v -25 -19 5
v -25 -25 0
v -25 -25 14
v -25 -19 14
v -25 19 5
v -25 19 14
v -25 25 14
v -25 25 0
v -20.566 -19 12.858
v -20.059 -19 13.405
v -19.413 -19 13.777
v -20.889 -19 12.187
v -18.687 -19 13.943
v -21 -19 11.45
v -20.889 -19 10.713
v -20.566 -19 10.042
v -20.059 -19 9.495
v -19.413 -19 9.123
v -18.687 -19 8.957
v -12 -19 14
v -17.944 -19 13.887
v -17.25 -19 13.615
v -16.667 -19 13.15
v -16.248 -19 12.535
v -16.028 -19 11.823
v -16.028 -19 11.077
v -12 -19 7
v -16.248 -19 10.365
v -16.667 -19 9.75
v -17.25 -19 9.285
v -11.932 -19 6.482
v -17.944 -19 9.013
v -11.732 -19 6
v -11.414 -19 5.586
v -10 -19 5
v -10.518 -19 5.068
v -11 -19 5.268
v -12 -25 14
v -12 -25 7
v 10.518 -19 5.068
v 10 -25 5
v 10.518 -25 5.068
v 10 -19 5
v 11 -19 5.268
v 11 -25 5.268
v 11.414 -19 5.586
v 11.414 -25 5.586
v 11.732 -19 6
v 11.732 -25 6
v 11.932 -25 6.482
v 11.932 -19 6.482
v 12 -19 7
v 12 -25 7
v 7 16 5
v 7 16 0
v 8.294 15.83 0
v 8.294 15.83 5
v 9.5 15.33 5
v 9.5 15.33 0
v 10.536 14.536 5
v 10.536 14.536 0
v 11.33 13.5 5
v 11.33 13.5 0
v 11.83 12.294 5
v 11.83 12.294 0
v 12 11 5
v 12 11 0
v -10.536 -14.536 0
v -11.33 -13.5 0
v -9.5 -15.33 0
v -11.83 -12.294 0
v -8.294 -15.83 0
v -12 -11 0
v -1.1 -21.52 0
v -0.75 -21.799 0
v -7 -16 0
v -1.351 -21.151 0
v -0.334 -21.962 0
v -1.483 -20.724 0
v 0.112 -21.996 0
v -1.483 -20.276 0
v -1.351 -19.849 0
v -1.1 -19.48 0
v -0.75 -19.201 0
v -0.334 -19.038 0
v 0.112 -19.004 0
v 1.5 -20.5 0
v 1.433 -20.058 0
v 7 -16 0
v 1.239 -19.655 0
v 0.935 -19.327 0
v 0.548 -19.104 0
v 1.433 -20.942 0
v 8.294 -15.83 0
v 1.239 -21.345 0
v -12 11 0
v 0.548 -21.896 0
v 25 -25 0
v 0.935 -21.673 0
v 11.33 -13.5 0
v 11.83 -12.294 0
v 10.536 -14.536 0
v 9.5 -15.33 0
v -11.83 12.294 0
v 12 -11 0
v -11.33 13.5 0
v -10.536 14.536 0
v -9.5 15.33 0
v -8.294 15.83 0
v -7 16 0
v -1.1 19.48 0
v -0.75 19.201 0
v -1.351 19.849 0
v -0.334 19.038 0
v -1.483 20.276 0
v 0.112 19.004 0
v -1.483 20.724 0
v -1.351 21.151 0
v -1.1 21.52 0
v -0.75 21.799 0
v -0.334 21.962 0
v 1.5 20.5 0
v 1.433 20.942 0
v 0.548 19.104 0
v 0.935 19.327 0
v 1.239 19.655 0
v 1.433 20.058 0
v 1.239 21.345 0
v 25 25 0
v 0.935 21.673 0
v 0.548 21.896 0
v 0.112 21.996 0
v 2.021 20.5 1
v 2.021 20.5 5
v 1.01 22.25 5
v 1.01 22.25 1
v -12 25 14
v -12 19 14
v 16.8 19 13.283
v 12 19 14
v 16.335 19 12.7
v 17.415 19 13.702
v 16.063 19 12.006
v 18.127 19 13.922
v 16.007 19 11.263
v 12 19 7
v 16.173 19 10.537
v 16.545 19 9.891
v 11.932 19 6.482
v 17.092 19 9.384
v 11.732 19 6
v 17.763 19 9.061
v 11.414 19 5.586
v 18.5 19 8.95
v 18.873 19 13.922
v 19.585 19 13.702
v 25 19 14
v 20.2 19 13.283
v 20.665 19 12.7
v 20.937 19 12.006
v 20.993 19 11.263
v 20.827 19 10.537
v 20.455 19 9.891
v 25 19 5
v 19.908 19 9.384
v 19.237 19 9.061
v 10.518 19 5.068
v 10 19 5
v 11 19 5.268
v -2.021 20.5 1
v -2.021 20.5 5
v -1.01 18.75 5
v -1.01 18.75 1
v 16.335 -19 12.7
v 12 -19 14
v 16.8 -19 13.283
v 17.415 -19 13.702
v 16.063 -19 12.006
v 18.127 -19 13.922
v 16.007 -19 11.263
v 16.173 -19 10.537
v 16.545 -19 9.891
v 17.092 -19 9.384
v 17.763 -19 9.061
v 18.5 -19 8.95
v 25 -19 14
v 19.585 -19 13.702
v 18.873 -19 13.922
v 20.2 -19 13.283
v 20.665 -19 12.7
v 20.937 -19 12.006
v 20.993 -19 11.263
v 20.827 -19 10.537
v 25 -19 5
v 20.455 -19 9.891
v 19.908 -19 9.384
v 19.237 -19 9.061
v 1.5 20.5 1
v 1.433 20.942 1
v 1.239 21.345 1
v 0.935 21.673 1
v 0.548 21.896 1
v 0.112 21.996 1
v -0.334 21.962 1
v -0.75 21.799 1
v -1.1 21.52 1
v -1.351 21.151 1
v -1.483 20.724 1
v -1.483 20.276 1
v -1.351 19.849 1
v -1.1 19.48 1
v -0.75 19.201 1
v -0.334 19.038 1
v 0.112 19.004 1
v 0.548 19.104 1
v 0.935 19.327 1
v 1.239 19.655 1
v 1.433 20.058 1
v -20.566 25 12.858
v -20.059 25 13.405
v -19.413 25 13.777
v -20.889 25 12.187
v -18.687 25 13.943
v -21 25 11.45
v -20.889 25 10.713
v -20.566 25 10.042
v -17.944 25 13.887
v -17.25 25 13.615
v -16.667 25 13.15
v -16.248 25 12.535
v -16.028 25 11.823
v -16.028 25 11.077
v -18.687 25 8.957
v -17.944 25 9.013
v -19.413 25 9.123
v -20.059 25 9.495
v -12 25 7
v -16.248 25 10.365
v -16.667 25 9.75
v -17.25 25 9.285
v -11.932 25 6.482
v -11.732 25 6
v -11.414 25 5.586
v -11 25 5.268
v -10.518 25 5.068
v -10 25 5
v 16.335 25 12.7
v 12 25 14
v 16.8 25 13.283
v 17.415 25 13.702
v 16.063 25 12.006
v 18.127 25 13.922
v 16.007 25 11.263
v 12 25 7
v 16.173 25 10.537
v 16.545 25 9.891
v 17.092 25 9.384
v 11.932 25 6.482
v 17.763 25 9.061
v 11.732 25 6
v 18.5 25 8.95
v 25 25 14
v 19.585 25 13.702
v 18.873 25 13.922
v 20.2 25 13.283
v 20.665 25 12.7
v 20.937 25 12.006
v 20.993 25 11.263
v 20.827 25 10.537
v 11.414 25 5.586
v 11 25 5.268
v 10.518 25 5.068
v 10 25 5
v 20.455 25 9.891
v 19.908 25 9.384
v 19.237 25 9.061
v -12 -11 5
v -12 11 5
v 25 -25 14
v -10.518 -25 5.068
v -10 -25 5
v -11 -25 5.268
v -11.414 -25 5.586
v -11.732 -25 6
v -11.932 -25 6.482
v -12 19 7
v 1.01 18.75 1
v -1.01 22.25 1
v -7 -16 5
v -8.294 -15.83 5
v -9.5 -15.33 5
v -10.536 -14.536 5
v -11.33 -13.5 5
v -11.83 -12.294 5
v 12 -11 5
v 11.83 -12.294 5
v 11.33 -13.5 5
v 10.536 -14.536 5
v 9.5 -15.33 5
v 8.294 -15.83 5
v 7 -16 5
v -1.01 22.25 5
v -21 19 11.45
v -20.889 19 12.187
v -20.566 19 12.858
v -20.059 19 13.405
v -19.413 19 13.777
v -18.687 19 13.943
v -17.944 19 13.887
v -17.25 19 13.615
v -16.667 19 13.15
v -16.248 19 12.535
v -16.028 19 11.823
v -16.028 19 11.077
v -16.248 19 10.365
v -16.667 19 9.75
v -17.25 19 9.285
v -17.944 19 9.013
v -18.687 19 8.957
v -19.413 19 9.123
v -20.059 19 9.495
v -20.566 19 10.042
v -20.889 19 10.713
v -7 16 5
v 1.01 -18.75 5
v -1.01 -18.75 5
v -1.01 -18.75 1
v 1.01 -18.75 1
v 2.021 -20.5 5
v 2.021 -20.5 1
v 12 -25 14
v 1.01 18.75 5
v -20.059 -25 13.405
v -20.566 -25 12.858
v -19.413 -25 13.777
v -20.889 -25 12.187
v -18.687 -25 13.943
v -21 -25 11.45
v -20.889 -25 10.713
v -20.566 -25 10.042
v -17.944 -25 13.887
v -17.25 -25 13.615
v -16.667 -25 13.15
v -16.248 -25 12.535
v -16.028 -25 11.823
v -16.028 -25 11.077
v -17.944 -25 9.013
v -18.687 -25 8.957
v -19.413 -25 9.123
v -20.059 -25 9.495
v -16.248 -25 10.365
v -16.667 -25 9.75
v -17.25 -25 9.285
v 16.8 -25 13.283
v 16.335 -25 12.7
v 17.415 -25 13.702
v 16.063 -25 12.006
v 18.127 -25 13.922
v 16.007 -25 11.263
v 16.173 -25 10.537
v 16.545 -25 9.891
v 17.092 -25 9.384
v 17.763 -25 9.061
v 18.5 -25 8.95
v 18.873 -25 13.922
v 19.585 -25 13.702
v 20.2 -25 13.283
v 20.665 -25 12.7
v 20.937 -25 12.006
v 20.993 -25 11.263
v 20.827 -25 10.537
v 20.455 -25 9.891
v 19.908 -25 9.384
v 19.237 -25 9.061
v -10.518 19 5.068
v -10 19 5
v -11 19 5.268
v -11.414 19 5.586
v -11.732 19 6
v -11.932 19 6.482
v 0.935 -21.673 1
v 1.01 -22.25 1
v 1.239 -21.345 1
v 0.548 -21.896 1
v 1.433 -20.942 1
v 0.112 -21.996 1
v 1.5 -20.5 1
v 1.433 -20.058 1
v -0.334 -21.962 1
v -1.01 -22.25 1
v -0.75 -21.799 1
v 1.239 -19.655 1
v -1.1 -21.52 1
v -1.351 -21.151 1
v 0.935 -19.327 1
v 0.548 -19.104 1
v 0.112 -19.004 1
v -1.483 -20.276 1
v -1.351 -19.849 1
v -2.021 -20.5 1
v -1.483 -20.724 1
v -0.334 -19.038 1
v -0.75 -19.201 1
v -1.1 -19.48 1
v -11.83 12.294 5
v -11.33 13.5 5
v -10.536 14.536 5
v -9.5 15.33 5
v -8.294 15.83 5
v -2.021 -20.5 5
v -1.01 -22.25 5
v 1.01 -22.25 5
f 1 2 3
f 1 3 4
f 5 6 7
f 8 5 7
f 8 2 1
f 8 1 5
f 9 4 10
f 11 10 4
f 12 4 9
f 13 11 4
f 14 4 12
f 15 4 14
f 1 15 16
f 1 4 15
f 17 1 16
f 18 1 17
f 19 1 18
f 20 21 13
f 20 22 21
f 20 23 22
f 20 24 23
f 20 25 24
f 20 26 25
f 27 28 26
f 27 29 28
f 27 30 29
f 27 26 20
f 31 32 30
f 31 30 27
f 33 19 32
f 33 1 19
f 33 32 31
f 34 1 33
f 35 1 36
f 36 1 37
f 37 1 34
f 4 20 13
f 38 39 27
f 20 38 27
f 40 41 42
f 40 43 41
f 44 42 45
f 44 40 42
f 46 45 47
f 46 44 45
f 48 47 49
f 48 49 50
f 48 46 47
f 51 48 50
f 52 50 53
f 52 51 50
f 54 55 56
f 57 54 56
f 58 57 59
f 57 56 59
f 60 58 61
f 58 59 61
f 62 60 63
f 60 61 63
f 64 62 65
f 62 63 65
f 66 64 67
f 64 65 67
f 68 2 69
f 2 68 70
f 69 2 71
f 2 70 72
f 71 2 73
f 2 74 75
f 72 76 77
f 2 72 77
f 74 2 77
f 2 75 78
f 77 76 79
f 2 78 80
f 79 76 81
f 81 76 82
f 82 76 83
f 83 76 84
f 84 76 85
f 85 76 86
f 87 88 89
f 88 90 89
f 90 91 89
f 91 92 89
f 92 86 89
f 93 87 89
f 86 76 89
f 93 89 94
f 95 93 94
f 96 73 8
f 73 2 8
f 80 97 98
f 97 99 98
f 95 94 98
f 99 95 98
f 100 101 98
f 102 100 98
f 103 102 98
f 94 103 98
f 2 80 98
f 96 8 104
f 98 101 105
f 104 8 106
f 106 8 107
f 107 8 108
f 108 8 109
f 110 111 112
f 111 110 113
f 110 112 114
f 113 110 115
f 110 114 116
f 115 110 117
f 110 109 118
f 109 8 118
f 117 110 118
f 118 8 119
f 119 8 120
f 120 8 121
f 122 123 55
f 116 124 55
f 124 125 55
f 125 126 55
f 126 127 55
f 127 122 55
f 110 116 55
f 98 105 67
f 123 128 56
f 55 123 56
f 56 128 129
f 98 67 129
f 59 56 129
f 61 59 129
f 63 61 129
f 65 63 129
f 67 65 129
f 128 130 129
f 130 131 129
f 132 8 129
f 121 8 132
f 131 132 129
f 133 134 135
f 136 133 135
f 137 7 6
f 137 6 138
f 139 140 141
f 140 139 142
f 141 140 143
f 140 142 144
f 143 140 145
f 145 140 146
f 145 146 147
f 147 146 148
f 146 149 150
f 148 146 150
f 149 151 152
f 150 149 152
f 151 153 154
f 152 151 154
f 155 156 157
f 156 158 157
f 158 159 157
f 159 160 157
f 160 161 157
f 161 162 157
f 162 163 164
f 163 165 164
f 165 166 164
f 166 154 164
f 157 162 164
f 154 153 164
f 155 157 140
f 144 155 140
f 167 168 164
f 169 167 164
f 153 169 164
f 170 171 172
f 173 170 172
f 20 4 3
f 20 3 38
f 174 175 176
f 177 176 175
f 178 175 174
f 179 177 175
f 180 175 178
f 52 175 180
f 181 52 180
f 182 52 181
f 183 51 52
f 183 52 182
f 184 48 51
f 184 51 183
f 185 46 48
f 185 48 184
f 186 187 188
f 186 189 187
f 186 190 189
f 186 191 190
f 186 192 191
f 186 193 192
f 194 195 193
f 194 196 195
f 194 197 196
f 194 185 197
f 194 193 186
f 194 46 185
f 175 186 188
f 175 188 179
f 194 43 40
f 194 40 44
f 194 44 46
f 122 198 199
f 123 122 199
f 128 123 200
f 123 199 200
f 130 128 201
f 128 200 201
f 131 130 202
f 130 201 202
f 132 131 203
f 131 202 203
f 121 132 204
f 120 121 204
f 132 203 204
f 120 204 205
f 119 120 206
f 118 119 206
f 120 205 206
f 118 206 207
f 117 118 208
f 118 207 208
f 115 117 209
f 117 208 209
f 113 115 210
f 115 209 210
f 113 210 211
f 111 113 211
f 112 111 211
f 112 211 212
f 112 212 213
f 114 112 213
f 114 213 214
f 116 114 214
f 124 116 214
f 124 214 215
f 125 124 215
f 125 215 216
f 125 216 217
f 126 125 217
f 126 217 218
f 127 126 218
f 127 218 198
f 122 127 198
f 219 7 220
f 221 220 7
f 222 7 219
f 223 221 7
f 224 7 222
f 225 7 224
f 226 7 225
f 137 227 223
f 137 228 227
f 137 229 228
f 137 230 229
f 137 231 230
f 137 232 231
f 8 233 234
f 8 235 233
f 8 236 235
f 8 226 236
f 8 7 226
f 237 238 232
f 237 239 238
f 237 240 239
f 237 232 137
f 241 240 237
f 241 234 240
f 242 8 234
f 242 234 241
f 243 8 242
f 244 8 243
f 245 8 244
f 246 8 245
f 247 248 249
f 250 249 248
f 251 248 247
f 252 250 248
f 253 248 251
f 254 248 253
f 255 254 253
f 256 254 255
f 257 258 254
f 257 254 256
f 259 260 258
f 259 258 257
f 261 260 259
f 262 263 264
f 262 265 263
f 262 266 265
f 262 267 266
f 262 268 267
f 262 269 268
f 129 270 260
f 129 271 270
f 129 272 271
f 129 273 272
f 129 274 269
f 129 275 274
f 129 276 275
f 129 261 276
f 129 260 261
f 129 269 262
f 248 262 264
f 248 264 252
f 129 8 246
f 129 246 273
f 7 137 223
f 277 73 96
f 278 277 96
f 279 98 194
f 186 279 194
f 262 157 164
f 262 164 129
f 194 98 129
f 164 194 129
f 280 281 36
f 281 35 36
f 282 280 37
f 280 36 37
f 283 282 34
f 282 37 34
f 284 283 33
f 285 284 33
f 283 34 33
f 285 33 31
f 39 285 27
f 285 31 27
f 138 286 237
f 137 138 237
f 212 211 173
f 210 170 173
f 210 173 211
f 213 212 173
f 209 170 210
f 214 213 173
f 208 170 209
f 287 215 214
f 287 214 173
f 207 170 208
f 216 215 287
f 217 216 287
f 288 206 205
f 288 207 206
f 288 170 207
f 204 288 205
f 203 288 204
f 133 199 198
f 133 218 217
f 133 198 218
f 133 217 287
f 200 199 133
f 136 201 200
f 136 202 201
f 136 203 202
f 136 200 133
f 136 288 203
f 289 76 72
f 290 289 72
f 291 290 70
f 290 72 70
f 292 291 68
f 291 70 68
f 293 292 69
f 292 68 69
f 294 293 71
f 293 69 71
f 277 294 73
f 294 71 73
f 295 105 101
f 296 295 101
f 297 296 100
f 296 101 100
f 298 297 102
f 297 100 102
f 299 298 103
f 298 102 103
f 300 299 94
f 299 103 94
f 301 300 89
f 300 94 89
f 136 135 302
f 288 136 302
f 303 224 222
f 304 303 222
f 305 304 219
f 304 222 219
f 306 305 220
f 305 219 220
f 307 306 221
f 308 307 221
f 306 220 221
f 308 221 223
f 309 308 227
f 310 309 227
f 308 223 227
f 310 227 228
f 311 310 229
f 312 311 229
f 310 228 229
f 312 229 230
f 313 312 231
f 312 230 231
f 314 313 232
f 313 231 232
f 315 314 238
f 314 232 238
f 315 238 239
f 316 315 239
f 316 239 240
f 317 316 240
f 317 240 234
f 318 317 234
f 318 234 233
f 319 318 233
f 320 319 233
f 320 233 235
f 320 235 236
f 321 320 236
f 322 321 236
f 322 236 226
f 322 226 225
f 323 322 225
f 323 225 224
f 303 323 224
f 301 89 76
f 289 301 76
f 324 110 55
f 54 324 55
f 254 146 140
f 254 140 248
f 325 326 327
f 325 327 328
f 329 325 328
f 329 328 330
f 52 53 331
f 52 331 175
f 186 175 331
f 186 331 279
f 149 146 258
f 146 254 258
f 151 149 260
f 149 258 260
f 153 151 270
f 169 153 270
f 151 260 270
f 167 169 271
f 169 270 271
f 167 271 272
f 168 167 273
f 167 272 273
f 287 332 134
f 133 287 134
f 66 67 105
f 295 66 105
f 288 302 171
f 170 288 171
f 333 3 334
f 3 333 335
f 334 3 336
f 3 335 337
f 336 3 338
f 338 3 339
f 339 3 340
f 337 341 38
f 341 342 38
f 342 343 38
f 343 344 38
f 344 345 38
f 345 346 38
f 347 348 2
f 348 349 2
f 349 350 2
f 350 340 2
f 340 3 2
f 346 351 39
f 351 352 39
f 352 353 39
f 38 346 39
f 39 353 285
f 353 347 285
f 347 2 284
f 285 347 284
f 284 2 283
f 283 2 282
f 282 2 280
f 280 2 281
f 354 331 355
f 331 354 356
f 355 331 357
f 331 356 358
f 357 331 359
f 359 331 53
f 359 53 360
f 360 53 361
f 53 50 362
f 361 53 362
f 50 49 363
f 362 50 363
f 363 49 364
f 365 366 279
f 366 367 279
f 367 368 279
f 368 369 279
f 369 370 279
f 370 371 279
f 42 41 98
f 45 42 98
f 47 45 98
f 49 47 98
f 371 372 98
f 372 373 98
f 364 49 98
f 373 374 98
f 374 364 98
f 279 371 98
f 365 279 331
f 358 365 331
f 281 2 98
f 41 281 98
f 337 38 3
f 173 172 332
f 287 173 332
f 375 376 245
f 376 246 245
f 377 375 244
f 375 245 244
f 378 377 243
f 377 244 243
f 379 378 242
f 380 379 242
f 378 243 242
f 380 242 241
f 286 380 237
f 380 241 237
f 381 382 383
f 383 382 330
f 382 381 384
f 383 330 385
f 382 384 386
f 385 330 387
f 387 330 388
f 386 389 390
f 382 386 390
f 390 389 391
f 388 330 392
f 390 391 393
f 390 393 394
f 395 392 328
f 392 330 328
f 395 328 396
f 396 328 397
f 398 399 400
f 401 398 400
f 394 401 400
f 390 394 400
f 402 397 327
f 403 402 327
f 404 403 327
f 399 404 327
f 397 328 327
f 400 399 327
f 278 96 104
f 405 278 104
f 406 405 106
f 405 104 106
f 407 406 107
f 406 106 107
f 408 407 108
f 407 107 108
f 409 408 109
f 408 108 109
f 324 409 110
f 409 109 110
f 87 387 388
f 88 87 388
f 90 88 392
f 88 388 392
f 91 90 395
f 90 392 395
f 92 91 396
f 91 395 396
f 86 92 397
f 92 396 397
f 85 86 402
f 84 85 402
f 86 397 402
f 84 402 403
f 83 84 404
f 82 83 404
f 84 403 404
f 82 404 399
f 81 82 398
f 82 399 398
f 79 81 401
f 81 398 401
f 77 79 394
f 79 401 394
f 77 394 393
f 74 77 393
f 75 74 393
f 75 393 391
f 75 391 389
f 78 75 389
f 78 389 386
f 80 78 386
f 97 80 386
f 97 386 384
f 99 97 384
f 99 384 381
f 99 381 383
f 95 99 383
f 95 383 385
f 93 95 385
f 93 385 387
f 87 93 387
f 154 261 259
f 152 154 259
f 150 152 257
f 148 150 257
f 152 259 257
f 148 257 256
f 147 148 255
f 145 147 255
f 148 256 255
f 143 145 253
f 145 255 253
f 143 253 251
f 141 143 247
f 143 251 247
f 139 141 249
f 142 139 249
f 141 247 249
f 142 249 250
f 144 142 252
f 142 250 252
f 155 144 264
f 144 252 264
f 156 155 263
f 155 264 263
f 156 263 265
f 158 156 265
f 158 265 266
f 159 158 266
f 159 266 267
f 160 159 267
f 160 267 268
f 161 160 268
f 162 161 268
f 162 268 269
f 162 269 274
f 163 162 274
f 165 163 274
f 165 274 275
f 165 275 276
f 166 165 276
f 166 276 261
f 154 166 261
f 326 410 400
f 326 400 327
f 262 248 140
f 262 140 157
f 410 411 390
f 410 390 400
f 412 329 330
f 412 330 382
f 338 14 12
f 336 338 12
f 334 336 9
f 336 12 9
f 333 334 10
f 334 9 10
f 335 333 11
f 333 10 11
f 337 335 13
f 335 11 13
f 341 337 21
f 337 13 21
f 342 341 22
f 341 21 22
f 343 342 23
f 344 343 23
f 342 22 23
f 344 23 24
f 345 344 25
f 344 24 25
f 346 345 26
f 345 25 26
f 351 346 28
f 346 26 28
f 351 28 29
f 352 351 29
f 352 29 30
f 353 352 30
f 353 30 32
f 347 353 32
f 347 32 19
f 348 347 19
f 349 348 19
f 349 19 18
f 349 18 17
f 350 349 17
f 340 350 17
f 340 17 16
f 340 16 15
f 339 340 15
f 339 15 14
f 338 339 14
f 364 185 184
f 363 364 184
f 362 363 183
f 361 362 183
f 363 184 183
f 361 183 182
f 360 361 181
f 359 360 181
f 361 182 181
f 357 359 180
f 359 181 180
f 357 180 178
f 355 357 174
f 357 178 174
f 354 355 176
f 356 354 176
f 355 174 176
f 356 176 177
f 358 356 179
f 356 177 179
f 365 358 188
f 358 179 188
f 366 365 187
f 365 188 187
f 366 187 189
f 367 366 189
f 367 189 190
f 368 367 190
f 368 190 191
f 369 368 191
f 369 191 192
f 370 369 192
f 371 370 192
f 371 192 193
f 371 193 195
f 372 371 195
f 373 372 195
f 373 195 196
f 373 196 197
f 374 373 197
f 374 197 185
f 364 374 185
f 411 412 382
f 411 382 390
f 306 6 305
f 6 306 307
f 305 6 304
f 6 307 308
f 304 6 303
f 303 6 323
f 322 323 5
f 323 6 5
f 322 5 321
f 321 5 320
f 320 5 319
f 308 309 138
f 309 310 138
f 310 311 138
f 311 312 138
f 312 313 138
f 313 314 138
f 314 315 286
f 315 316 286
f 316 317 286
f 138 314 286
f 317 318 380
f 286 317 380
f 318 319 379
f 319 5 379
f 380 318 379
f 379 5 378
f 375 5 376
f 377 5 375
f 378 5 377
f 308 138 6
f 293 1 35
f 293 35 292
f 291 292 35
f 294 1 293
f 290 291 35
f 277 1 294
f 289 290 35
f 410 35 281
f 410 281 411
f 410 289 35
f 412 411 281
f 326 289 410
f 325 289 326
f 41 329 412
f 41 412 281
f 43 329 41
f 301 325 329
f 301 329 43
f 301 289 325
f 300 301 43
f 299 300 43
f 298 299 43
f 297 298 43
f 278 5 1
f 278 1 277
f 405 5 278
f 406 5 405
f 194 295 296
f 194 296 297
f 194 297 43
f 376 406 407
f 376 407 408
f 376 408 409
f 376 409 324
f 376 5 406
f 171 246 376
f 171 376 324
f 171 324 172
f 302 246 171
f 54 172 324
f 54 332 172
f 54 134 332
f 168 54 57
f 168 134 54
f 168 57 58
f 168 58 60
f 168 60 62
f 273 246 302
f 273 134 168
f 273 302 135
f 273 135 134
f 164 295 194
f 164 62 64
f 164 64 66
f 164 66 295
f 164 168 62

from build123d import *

# Parameters (mm, degrees)
CROQUIS1_W              = 50
CROQUIS1_H              = 50
SALIENTE_EXTRUIR1_DEPTH = 5
CROQUIS2_W              = 13
CROQUIS2_H              = 6
SALIENTE_EXTRUIR2_DEPTH = 9
CROQUIS3_R              = 2.5
CORTAR_EXTRUIR5_DEPTH   = 58.628118137
REDONDEO1_R             = 2
CORTAR_EXTRUIR6_DEPTH   = 4
CROQUIS5_R              = 1.5
CORTAR_EXTRUIR7_DEPTH   = 4


with BuildPart() as part:
    # Croquis1 → Saliente-Extruir1 (new body)
    with BuildSketch(Plane.XY):
        Rectangle(CROQUIS1_W, CROQUIS1_H)
        with BuildLine():
            Line((7, -16), (-7, -16))
            ThreePointArc((-7, -16), (-10.535533906, -14.535533906), (-12, -11))
            Line((-12, -11), (-12, 11))
            ThreePointArc((-12, 11), (-10.535533906, 14.535533906), (-7, 16))
            Line((-7, 16), (7, 16))
            ThreePointArc((7, 16), (10.535533906, 14.535533906), (12, 11))
            Line((12, 11), (12, -11))
            ThreePointArc((12, -11), (10.535533906, -14.535533906), (7, -16))
        make_face(mode=Mode.SUBTRACT)
    extrude(amount=SALIENTE_EXTRUIR1_DEPTH)

    # Croquis2 → Saliente-Extruir2 (add)
    with BuildSketch(Plane.XY.offset(5)):
        with Locations((18.5, 22)):
            Rectangle(CROQUIS2_W, CROQUIS2_H)
        with Locations((-18.5, 22)):
            Rectangle(CROQUIS2_W, CROQUIS2_H)
        with Locations((18.5, -22)):
            Rectangle(CROQUIS2_W, CROQUIS2_H)
        with Locations((-18.5, -22)):
            Rectangle(CROQUIS2_W, CROQUIS2_H)
    extrude(amount=SALIENTE_EXTRUIR2_DEPTH)

    # Croquis3 → Cortar-Extruir5 (cut, through all)
    with BuildSketch(Plane(origin=(0, 25, 0), x_dir=(1, 0, 0), z_dir=(0, 1, 0))):
        with Locations(Location((-18.5, -11.45, 0), (0, 0, 180))):
            Circle(CROQUIS3_R)
        with Locations(Location((18.5, -11.45, 0), (0, 0, 90))):
            Circle(CROQUIS3_R)
    extrude(amount=-CORTAR_EXTRUIR5_DEPTH, mode=Mode.SUBTRACT)

    # Redondeo1
    redondeo1_edges = [part.edges().sort_by_distance(p)[0] for p in [
        (-12, 22, 5),
        (12, 22, 5),
        (12, -22, 5),
        (-12, -22, 5),
    ]]
    fillet(redondeo1_edges, radius=REDONDEO1_R)

    # Croquis4 → Cortar-Extruir6 (cut)
    with BuildSketch(Plane.XY.offset(5)):
        Polygon((-1.010362971, 18.75), (1.010362971, 18.75), (2.020725942, 20.5), (1.010362971, 22.25), (-1.010362971, 22.25), (-2.020725942, 20.5), align=None)
        Polygon((-2.020725942, -20.5), (-1.010362971, -18.75), (1.010362971, -18.75), (2.020725942, -20.5), (1.010362971, -22.25), (-1.010362971, -22.25), align=None)
    extrude(amount=-CORTAR_EXTRUIR6_DEPTH, mode=Mode.SUBTRACT)

    # Croquis5 → Cortar-Extruir7 (cut)
    with BuildSketch(Plane.XY.offset(1)):
        with Locations((0, 20.5)):
            Circle(CROQUIS5_R)
        with Locations((0, -20.5)):
            Circle(CROQUIS5_R)
    extrude(amount=-CORTAR_EXTRUIR7_DEPTH, mode=Mode.SUBTRACT)


solid = part.part
